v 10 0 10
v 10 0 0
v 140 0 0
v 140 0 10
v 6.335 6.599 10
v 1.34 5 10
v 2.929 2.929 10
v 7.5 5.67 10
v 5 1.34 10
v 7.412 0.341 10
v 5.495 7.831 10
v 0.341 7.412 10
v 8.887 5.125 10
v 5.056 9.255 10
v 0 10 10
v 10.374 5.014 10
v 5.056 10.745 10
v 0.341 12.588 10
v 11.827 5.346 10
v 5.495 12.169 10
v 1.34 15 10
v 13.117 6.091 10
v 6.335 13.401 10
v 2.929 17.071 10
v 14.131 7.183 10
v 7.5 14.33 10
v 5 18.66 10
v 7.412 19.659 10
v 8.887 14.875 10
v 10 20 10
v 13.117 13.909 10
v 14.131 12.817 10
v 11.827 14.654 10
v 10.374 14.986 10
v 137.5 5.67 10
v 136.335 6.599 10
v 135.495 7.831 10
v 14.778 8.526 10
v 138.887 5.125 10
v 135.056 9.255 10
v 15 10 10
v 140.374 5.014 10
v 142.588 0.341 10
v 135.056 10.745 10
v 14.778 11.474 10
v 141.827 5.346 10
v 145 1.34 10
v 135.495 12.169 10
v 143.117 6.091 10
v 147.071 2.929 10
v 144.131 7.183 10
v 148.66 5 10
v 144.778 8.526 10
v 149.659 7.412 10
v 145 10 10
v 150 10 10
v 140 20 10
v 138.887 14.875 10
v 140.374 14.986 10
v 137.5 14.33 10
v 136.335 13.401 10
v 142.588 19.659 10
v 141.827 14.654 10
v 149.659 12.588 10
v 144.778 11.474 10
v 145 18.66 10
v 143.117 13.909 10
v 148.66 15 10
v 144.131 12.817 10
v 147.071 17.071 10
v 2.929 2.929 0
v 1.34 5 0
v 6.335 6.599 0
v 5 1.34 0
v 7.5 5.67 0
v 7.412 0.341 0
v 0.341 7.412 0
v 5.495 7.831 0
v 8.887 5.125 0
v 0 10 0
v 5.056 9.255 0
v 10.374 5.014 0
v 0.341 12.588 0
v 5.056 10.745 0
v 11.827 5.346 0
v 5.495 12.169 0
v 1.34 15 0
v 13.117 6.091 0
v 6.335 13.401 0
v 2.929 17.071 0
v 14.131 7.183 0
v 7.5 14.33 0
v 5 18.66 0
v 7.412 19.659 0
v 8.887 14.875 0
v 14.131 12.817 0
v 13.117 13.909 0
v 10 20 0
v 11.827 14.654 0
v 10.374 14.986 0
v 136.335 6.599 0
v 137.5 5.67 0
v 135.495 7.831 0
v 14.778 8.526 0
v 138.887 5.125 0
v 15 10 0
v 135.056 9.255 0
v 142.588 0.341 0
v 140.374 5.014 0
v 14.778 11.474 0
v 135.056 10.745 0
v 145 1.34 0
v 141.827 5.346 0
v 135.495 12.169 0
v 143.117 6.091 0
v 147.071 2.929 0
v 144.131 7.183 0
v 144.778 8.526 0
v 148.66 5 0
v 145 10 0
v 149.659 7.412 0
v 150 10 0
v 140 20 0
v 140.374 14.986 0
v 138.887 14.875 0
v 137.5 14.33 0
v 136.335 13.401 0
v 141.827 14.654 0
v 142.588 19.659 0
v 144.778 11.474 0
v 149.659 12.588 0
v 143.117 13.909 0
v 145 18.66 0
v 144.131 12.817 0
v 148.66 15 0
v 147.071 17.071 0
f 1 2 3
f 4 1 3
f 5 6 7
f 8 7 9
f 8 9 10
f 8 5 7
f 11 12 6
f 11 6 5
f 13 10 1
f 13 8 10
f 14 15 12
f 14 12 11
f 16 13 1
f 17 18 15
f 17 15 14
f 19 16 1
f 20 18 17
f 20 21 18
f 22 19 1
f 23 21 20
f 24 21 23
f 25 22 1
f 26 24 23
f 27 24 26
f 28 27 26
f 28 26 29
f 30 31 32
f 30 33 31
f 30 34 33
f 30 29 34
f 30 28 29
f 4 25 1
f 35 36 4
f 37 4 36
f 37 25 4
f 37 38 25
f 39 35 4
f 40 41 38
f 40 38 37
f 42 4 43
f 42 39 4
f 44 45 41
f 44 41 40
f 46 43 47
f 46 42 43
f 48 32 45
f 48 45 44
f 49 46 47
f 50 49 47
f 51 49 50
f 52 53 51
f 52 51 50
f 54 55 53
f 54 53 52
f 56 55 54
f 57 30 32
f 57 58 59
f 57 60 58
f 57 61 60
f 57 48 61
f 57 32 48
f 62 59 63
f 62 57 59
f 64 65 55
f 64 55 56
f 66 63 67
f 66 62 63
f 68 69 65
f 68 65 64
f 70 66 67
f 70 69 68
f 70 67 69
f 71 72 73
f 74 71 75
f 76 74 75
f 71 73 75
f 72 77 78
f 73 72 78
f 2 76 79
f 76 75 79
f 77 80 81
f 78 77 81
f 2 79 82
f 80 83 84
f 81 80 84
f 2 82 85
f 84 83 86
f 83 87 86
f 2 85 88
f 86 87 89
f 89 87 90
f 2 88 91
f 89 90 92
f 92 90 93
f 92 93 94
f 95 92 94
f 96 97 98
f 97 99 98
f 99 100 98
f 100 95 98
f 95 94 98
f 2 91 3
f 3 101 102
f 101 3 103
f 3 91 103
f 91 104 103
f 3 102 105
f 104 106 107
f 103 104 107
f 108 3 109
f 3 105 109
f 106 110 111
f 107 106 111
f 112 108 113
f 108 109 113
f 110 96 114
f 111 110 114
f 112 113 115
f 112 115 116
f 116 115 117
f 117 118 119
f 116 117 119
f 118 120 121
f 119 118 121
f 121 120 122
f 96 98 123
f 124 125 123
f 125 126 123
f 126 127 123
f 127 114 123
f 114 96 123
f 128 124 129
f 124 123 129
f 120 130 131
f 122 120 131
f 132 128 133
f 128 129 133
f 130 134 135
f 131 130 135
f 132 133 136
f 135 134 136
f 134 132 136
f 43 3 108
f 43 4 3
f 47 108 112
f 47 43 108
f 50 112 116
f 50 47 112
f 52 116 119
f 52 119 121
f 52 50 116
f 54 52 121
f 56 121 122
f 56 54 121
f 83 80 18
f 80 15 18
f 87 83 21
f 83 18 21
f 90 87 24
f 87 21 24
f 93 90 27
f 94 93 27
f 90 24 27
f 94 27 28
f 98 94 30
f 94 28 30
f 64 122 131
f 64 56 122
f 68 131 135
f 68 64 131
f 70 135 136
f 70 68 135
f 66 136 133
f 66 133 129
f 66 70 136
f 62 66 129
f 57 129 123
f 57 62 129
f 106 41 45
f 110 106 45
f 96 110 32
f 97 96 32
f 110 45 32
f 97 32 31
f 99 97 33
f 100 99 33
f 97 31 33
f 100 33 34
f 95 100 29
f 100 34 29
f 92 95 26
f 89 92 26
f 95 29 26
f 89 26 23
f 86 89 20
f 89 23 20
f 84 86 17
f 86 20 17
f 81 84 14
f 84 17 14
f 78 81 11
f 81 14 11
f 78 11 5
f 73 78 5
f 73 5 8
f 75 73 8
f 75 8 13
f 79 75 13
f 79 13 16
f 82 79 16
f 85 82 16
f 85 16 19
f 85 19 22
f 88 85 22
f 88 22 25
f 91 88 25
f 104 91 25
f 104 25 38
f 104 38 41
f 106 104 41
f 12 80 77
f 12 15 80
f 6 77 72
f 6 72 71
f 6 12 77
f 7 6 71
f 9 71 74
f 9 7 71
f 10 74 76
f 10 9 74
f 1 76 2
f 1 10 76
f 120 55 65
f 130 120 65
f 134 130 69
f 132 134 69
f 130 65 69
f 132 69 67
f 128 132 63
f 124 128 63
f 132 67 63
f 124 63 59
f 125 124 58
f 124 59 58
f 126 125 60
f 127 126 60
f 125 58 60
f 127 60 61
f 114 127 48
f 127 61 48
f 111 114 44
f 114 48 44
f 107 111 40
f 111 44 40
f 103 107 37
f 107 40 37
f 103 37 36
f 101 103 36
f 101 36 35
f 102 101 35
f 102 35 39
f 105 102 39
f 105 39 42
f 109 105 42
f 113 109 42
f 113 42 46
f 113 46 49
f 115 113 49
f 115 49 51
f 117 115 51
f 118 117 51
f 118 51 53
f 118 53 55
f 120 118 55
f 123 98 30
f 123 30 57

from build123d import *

# Parameters (mm, degrees)
SKETCH1_W           = 150
SKETCH1_H           = 20
BOSS_EXTRUDE1_DEPTH = 10
FILLET1_R           = 10
SKETCH2_R           = 5
CUT_EXTRUDE1_DEPTH  = 152.657508881


with BuildPart() as part:
    # Sketch1 → Boss-Extrude1 (new body)
    with BuildSketch(Plane.XY):
        with Locations((75, 10)):
            Rectangle(SKETCH1_W, SKETCH1_H)
    extrude(amount=BOSS_EXTRUDE1_DEPTH)

    # Fillet1
    fillet1_edges = [part.edges().sort_by_distance(p)[0] for p in [
        (0, 0, 5),
        (150, 0, 5),
        (150, 20, 5),
        (0, 20, 5),
    ]]
    fillet(fillet1_edges, radius=FILLET1_R - 0.0001)  # a hair under: the kernel refuses the full size

    # Sketch2 → Cut-Extrude1 (cut, through all)
    with BuildSketch(Plane.XY.offset(10)):
        with Locations((10, 10)):
            Circle(SKETCH2_R)
        with Locations((140, 10)):
            Circle(SKETCH2_R)
    extrude(amount=-CUT_EXTRUDE1_DEPTH, mode=Mode.SUBTRACT)


solid = part.part
